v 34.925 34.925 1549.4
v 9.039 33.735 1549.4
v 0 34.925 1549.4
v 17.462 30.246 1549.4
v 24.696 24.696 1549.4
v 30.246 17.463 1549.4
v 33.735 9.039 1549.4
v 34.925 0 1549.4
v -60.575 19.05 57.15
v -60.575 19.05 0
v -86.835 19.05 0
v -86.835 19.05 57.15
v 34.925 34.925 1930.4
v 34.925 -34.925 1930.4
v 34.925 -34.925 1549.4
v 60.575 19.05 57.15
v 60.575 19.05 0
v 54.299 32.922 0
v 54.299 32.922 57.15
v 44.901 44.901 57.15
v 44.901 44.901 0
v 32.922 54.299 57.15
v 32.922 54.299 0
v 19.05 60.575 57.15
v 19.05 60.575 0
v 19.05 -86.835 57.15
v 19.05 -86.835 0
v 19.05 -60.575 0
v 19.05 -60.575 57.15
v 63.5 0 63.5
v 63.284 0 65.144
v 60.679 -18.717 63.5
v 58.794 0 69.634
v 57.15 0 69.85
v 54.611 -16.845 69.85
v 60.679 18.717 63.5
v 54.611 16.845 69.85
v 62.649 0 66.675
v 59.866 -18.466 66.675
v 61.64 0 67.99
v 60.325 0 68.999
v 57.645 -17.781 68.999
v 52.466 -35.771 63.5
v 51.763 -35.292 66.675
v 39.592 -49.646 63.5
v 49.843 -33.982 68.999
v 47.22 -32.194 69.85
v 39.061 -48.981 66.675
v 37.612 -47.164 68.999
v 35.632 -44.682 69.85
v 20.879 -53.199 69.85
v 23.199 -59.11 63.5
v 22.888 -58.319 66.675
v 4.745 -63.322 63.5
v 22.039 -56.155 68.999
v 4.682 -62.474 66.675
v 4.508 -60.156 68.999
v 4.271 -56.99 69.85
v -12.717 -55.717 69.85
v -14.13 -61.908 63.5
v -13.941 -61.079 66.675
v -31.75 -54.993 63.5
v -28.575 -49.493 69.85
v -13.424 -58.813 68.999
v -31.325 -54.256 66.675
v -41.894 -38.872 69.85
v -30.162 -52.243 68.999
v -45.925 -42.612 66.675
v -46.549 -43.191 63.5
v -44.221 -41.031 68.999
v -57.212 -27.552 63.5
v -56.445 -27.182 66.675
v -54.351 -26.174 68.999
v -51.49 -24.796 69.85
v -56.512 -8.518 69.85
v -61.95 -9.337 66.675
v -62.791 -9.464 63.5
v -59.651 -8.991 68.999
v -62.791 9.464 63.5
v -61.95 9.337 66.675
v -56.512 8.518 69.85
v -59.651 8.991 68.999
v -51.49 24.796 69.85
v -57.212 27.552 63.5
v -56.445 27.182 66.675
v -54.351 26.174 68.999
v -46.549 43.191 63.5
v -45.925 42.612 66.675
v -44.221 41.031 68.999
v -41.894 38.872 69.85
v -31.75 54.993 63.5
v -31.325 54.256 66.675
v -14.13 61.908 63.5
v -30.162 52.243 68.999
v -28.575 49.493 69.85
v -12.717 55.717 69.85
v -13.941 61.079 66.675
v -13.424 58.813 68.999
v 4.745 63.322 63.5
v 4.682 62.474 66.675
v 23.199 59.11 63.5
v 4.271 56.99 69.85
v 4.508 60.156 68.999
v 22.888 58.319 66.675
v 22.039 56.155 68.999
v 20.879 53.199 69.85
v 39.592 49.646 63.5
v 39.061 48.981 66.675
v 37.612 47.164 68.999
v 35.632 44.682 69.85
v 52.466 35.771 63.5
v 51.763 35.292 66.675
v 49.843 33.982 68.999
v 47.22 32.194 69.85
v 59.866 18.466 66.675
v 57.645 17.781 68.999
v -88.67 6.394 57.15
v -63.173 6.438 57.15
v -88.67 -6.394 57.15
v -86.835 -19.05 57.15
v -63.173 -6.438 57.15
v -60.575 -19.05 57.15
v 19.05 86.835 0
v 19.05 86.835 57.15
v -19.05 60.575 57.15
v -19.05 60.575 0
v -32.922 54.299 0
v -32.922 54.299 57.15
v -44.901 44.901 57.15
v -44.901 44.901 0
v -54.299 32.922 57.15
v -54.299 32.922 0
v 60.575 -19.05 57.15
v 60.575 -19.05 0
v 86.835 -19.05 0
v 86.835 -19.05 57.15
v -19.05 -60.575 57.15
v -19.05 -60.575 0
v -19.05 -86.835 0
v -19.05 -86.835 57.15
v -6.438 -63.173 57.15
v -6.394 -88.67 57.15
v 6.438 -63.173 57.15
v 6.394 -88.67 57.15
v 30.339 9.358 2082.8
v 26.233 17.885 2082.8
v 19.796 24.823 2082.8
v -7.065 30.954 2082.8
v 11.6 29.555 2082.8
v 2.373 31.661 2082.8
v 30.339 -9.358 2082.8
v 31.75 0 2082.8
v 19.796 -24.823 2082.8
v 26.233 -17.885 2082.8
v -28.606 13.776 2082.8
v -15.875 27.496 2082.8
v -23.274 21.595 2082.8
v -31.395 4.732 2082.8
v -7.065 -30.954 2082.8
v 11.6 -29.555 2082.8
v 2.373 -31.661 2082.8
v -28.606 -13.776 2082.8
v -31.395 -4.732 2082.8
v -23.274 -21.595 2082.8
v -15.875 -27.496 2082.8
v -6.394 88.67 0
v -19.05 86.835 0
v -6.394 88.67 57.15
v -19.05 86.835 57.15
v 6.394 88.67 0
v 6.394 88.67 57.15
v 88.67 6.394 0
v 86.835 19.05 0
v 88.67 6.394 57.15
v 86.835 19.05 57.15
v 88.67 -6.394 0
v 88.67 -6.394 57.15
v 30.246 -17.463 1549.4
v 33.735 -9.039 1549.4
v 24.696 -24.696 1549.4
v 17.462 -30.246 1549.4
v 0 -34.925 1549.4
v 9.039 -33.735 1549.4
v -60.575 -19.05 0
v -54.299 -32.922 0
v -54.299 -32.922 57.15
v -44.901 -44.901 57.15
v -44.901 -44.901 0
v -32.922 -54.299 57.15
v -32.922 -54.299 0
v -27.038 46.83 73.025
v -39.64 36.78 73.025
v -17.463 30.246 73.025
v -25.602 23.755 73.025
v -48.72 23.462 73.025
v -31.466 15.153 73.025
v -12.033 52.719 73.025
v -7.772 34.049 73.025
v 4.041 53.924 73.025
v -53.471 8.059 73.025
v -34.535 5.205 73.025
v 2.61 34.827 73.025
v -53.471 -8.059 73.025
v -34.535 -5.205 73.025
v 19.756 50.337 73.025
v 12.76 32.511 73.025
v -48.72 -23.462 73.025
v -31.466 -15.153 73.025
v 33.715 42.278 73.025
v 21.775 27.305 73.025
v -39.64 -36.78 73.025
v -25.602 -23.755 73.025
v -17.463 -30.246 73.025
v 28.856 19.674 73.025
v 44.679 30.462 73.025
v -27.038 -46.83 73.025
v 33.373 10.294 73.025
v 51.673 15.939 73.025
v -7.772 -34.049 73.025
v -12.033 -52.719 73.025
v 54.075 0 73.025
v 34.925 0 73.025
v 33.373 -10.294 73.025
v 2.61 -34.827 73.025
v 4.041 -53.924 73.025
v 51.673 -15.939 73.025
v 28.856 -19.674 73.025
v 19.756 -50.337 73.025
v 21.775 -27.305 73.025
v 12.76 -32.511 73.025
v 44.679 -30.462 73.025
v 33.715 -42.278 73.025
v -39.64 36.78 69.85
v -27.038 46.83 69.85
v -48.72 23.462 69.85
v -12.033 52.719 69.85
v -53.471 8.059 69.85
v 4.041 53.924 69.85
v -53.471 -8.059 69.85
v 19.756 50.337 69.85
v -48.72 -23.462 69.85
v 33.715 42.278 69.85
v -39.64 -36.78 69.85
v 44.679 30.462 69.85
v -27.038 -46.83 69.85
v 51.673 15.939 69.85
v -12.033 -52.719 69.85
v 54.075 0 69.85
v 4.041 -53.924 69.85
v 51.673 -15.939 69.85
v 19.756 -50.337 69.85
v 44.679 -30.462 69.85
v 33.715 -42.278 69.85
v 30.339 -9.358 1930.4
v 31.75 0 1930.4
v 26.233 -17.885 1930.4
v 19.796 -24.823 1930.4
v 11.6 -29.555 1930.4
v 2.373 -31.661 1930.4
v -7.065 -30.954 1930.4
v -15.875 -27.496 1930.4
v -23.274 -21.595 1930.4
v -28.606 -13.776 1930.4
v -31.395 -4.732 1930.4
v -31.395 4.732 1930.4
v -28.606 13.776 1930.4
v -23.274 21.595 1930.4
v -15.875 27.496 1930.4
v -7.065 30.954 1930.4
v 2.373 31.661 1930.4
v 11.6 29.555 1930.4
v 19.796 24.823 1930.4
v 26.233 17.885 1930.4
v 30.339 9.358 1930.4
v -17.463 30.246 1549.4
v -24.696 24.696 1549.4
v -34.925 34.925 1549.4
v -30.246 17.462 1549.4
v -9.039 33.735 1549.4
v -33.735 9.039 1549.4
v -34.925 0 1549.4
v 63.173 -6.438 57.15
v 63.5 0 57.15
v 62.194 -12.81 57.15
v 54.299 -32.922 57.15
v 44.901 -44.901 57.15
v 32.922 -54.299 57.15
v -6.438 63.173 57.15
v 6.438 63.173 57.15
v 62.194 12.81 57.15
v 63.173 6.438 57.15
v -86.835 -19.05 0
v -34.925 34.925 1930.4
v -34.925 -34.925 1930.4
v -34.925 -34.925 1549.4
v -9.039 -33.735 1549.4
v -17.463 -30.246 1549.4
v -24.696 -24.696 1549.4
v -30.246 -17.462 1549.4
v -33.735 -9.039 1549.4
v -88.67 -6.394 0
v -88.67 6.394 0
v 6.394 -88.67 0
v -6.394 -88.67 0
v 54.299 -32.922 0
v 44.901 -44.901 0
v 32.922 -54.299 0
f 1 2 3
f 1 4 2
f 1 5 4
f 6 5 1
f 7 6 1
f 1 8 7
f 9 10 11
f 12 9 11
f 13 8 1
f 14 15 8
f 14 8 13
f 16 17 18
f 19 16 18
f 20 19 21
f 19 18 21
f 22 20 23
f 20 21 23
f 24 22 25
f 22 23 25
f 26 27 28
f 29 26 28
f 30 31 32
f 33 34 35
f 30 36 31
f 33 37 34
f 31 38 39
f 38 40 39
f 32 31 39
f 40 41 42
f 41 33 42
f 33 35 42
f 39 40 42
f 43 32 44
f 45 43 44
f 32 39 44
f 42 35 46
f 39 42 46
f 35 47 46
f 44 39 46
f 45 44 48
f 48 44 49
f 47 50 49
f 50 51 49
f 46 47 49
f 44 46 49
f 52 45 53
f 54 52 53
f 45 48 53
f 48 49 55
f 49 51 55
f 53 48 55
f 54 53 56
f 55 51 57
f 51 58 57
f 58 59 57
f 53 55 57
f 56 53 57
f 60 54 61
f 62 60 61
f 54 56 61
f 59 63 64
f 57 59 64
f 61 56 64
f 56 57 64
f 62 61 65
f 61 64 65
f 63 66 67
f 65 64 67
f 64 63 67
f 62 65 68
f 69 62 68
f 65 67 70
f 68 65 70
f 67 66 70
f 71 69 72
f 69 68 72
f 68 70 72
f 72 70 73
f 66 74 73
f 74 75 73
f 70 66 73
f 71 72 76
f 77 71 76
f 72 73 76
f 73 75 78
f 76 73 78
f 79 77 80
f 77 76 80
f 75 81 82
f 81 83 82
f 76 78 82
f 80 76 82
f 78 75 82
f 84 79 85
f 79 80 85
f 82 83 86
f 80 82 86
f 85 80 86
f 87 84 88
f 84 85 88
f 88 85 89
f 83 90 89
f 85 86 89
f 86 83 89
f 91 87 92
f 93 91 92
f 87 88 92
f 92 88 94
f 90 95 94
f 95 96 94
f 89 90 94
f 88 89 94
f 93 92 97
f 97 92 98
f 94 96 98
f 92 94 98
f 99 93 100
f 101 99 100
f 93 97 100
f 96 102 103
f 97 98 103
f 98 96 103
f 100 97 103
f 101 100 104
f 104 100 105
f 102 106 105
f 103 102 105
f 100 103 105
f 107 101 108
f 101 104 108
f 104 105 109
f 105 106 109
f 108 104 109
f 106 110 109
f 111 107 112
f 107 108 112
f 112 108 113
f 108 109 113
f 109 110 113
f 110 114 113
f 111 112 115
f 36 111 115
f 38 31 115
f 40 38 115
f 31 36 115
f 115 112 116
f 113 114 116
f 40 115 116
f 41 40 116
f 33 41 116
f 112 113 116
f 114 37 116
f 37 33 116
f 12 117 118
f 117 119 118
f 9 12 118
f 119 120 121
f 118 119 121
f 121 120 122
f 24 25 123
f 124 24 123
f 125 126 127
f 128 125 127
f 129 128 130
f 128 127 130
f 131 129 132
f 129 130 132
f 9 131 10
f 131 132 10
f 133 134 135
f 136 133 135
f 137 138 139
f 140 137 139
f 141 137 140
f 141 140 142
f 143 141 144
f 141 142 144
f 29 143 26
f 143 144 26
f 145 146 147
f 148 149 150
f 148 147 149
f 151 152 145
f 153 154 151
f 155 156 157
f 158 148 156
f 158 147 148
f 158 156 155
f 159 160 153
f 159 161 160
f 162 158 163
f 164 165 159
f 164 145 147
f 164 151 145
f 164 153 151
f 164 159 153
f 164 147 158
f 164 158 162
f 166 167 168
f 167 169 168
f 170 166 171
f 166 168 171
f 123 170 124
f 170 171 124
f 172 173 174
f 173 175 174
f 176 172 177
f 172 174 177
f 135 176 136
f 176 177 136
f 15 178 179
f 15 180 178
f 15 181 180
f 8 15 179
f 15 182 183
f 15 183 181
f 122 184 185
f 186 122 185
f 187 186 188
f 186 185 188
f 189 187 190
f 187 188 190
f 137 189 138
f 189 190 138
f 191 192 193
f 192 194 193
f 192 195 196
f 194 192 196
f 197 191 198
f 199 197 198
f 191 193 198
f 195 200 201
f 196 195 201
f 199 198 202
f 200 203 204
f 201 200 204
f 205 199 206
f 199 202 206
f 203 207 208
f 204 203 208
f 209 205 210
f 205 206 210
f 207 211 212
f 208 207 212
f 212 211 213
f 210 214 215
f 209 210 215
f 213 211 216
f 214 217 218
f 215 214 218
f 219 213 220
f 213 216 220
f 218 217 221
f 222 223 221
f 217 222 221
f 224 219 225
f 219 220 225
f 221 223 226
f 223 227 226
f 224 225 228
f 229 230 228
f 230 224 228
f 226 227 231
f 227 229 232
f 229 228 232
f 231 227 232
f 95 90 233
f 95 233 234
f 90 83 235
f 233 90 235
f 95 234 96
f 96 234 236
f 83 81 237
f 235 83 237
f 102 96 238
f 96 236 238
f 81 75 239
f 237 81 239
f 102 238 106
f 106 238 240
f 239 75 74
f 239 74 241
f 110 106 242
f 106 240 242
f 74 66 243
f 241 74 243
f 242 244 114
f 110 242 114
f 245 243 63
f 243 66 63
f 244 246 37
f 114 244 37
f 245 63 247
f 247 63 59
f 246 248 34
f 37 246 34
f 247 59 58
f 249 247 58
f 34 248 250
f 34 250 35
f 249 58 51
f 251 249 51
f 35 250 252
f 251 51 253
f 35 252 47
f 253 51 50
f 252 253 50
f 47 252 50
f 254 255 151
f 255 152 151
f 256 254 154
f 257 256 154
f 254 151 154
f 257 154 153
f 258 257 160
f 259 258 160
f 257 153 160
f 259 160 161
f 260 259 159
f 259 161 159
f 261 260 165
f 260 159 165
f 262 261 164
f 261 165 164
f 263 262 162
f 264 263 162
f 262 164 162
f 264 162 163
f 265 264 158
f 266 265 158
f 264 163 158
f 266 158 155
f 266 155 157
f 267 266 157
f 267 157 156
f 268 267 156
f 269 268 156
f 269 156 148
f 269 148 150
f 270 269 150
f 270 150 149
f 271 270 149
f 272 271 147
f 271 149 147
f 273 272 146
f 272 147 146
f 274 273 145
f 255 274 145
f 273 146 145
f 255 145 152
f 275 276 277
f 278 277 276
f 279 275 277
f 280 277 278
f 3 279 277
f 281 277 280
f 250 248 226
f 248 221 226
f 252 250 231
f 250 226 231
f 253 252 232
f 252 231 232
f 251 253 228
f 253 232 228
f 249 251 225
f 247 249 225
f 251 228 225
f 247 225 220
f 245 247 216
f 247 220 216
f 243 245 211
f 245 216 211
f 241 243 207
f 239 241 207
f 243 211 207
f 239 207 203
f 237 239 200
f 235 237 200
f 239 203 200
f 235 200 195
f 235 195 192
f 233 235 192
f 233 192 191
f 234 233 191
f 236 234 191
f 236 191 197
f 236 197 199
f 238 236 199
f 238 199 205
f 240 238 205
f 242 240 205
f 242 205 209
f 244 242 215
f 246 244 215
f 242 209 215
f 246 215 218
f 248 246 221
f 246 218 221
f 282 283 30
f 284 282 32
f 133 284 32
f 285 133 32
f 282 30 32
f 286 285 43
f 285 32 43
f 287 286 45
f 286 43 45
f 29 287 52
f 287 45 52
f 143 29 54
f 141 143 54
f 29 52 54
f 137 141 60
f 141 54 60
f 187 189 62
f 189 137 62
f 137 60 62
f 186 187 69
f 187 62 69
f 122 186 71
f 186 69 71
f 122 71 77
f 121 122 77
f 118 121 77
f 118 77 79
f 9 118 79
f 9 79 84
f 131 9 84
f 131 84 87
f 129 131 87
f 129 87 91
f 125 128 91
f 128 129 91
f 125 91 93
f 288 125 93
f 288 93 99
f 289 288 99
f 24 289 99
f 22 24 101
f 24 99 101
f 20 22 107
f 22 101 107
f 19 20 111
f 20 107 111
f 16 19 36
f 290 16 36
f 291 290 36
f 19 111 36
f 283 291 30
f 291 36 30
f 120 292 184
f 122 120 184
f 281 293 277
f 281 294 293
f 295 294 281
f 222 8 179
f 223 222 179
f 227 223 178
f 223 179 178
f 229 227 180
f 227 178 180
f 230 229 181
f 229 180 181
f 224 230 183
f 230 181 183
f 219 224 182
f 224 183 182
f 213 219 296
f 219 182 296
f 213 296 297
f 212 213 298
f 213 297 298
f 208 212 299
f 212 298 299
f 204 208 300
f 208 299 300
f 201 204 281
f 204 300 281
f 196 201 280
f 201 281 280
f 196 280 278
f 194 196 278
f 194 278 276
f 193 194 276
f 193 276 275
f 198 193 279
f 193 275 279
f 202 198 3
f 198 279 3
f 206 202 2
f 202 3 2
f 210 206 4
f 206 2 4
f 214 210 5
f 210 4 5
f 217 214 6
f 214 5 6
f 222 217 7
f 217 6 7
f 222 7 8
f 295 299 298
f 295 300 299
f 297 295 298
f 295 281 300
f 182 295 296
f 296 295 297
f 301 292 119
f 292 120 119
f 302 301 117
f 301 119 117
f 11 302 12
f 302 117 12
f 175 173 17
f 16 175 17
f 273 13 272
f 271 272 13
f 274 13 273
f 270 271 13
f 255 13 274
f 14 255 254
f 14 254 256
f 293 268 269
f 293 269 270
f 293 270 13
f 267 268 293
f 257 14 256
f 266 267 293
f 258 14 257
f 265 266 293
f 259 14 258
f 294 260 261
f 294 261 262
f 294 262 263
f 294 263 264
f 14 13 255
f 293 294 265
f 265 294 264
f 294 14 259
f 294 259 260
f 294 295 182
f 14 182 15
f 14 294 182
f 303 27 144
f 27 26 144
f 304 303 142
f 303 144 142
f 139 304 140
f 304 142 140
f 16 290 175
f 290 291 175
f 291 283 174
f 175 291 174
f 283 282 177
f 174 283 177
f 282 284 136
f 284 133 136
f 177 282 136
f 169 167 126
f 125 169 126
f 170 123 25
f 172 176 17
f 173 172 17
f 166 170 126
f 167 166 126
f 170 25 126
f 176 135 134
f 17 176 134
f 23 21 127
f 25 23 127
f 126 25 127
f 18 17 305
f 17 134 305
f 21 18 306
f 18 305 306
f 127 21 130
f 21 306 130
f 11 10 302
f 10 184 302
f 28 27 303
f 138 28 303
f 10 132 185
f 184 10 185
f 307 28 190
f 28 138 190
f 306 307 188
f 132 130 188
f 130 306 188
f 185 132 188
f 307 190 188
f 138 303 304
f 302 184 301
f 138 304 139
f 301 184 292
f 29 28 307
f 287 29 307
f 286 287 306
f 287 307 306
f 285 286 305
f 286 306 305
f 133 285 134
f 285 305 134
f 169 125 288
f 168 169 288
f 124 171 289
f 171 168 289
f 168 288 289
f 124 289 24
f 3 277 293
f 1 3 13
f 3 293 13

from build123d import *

# Parameters (mm, degrees)
F3_DEPTH        = 34.925
F0_W            = 31.75
F0_H            = 152.4
F7_DEPTH        = 57.15
F7_COPIES_COUNT = 4


# Not quite as in the source:
# - a feature of the source that left no trace in its solid (it failed there, or was rolled back) is left out
# - a pattern or mirror of a feature is missing from the dataset's text; its kind, count and spacing are read off the source's solid


with BuildPart() as f1:
    # F0 (on Front) → F1 (revolve)
    with BuildSketch(Plane.XZ):
        with BuildLine():
            Line((34.925, 73.025), (34.925, 0))
            Line((34.925, 0), (88.9, 0))
            Line((88.9, 0), (88.9, 57.15))
            Line((88.9, 57.15), (63.5, 57.15))
            Line((63.5, 57.15), (63.5, 63.5))
            ThreePointArc((63.5, 63.5), (61.6401280605, 67.9901280605), (57.15, 69.85))
            Line((57.15, 69.85), (54.075, 69.85))
            Line((54.075, 69.85), (54.075, 73.025))
            Line((54.075, 73.025), (34.925, 73.025))
        make_face()
    revolve(axis=Axis((0, 0, -7.5624885379), (0, 0, -1)))

    # F0 (on Front) → F2 (revolve)
    with BuildSketch(Plane.XZ):
        Polygon((0, 1549.4), (0, 0), (34.925, 0), (34.925, 73.025), (34.925, 1549.4), align=None)
    revolve(axis=Axis((0, 0, -7.5624885379), (0, 0, -1)))

    # F0 (on Front) → F3 (join, symmetric)
    with BuildSketch(Plane.XZ):
        Polygon((-34.925, 1549.4), (0, 1549.4), (34.925, 1549.4), (34.925, 1930.4), (31.75, 1930.4), (0, 1930.4), (-34.925, 1930.4), align=None)
    extrude(amount=F3_DEPTH, both=True)

    # F0 (on Front) → F4 (revolve)
    with BuildSketch(Plane.XZ):
        with Locations((15.875, 2006.6)):
            Rectangle(F0_W, F0_H)
    revolve(axis=Axis((0, 0, -7.5624885379), (0, 0, -1)))

    # F6 (on face) → F7 (cut, through all)
    with BuildSketch(Plane(origin=(0, 0, 0), x_dir=(1, 0, 0), z_dir=(0, 0, -1))):
        with BuildLine():
            ThreePointArc((19.05, 60.57513929), (44.9012806053, 44.9012806053), (60.57513929, 19.05))
            Line((60.57513929, 19.05), (86.834944003, 19.05))
            ThreePointArc((86.834944003, 19.05), (62.8617928475, 62.8617928475), (19.05, 86.834944003))
            Line((19.05, 86.834944003), (19.05, 60.57513929))
        make_face()
    f7 = extrude(amount=-F7_DEPTH, mode=Mode.SUBTRACT)

    # F7_copies: F7 ×4 about axis
    f7_copies_axis = Axis((0, 0, 0), (0, 0, 1))
    for i in range(1, F7_COPIES_COUNT):
        add(f7.rotate(f7_copies_axis, i * 360 / F7_COPIES_COUNT), mode=Mode.SUBTRACT)


solid = f1.part
